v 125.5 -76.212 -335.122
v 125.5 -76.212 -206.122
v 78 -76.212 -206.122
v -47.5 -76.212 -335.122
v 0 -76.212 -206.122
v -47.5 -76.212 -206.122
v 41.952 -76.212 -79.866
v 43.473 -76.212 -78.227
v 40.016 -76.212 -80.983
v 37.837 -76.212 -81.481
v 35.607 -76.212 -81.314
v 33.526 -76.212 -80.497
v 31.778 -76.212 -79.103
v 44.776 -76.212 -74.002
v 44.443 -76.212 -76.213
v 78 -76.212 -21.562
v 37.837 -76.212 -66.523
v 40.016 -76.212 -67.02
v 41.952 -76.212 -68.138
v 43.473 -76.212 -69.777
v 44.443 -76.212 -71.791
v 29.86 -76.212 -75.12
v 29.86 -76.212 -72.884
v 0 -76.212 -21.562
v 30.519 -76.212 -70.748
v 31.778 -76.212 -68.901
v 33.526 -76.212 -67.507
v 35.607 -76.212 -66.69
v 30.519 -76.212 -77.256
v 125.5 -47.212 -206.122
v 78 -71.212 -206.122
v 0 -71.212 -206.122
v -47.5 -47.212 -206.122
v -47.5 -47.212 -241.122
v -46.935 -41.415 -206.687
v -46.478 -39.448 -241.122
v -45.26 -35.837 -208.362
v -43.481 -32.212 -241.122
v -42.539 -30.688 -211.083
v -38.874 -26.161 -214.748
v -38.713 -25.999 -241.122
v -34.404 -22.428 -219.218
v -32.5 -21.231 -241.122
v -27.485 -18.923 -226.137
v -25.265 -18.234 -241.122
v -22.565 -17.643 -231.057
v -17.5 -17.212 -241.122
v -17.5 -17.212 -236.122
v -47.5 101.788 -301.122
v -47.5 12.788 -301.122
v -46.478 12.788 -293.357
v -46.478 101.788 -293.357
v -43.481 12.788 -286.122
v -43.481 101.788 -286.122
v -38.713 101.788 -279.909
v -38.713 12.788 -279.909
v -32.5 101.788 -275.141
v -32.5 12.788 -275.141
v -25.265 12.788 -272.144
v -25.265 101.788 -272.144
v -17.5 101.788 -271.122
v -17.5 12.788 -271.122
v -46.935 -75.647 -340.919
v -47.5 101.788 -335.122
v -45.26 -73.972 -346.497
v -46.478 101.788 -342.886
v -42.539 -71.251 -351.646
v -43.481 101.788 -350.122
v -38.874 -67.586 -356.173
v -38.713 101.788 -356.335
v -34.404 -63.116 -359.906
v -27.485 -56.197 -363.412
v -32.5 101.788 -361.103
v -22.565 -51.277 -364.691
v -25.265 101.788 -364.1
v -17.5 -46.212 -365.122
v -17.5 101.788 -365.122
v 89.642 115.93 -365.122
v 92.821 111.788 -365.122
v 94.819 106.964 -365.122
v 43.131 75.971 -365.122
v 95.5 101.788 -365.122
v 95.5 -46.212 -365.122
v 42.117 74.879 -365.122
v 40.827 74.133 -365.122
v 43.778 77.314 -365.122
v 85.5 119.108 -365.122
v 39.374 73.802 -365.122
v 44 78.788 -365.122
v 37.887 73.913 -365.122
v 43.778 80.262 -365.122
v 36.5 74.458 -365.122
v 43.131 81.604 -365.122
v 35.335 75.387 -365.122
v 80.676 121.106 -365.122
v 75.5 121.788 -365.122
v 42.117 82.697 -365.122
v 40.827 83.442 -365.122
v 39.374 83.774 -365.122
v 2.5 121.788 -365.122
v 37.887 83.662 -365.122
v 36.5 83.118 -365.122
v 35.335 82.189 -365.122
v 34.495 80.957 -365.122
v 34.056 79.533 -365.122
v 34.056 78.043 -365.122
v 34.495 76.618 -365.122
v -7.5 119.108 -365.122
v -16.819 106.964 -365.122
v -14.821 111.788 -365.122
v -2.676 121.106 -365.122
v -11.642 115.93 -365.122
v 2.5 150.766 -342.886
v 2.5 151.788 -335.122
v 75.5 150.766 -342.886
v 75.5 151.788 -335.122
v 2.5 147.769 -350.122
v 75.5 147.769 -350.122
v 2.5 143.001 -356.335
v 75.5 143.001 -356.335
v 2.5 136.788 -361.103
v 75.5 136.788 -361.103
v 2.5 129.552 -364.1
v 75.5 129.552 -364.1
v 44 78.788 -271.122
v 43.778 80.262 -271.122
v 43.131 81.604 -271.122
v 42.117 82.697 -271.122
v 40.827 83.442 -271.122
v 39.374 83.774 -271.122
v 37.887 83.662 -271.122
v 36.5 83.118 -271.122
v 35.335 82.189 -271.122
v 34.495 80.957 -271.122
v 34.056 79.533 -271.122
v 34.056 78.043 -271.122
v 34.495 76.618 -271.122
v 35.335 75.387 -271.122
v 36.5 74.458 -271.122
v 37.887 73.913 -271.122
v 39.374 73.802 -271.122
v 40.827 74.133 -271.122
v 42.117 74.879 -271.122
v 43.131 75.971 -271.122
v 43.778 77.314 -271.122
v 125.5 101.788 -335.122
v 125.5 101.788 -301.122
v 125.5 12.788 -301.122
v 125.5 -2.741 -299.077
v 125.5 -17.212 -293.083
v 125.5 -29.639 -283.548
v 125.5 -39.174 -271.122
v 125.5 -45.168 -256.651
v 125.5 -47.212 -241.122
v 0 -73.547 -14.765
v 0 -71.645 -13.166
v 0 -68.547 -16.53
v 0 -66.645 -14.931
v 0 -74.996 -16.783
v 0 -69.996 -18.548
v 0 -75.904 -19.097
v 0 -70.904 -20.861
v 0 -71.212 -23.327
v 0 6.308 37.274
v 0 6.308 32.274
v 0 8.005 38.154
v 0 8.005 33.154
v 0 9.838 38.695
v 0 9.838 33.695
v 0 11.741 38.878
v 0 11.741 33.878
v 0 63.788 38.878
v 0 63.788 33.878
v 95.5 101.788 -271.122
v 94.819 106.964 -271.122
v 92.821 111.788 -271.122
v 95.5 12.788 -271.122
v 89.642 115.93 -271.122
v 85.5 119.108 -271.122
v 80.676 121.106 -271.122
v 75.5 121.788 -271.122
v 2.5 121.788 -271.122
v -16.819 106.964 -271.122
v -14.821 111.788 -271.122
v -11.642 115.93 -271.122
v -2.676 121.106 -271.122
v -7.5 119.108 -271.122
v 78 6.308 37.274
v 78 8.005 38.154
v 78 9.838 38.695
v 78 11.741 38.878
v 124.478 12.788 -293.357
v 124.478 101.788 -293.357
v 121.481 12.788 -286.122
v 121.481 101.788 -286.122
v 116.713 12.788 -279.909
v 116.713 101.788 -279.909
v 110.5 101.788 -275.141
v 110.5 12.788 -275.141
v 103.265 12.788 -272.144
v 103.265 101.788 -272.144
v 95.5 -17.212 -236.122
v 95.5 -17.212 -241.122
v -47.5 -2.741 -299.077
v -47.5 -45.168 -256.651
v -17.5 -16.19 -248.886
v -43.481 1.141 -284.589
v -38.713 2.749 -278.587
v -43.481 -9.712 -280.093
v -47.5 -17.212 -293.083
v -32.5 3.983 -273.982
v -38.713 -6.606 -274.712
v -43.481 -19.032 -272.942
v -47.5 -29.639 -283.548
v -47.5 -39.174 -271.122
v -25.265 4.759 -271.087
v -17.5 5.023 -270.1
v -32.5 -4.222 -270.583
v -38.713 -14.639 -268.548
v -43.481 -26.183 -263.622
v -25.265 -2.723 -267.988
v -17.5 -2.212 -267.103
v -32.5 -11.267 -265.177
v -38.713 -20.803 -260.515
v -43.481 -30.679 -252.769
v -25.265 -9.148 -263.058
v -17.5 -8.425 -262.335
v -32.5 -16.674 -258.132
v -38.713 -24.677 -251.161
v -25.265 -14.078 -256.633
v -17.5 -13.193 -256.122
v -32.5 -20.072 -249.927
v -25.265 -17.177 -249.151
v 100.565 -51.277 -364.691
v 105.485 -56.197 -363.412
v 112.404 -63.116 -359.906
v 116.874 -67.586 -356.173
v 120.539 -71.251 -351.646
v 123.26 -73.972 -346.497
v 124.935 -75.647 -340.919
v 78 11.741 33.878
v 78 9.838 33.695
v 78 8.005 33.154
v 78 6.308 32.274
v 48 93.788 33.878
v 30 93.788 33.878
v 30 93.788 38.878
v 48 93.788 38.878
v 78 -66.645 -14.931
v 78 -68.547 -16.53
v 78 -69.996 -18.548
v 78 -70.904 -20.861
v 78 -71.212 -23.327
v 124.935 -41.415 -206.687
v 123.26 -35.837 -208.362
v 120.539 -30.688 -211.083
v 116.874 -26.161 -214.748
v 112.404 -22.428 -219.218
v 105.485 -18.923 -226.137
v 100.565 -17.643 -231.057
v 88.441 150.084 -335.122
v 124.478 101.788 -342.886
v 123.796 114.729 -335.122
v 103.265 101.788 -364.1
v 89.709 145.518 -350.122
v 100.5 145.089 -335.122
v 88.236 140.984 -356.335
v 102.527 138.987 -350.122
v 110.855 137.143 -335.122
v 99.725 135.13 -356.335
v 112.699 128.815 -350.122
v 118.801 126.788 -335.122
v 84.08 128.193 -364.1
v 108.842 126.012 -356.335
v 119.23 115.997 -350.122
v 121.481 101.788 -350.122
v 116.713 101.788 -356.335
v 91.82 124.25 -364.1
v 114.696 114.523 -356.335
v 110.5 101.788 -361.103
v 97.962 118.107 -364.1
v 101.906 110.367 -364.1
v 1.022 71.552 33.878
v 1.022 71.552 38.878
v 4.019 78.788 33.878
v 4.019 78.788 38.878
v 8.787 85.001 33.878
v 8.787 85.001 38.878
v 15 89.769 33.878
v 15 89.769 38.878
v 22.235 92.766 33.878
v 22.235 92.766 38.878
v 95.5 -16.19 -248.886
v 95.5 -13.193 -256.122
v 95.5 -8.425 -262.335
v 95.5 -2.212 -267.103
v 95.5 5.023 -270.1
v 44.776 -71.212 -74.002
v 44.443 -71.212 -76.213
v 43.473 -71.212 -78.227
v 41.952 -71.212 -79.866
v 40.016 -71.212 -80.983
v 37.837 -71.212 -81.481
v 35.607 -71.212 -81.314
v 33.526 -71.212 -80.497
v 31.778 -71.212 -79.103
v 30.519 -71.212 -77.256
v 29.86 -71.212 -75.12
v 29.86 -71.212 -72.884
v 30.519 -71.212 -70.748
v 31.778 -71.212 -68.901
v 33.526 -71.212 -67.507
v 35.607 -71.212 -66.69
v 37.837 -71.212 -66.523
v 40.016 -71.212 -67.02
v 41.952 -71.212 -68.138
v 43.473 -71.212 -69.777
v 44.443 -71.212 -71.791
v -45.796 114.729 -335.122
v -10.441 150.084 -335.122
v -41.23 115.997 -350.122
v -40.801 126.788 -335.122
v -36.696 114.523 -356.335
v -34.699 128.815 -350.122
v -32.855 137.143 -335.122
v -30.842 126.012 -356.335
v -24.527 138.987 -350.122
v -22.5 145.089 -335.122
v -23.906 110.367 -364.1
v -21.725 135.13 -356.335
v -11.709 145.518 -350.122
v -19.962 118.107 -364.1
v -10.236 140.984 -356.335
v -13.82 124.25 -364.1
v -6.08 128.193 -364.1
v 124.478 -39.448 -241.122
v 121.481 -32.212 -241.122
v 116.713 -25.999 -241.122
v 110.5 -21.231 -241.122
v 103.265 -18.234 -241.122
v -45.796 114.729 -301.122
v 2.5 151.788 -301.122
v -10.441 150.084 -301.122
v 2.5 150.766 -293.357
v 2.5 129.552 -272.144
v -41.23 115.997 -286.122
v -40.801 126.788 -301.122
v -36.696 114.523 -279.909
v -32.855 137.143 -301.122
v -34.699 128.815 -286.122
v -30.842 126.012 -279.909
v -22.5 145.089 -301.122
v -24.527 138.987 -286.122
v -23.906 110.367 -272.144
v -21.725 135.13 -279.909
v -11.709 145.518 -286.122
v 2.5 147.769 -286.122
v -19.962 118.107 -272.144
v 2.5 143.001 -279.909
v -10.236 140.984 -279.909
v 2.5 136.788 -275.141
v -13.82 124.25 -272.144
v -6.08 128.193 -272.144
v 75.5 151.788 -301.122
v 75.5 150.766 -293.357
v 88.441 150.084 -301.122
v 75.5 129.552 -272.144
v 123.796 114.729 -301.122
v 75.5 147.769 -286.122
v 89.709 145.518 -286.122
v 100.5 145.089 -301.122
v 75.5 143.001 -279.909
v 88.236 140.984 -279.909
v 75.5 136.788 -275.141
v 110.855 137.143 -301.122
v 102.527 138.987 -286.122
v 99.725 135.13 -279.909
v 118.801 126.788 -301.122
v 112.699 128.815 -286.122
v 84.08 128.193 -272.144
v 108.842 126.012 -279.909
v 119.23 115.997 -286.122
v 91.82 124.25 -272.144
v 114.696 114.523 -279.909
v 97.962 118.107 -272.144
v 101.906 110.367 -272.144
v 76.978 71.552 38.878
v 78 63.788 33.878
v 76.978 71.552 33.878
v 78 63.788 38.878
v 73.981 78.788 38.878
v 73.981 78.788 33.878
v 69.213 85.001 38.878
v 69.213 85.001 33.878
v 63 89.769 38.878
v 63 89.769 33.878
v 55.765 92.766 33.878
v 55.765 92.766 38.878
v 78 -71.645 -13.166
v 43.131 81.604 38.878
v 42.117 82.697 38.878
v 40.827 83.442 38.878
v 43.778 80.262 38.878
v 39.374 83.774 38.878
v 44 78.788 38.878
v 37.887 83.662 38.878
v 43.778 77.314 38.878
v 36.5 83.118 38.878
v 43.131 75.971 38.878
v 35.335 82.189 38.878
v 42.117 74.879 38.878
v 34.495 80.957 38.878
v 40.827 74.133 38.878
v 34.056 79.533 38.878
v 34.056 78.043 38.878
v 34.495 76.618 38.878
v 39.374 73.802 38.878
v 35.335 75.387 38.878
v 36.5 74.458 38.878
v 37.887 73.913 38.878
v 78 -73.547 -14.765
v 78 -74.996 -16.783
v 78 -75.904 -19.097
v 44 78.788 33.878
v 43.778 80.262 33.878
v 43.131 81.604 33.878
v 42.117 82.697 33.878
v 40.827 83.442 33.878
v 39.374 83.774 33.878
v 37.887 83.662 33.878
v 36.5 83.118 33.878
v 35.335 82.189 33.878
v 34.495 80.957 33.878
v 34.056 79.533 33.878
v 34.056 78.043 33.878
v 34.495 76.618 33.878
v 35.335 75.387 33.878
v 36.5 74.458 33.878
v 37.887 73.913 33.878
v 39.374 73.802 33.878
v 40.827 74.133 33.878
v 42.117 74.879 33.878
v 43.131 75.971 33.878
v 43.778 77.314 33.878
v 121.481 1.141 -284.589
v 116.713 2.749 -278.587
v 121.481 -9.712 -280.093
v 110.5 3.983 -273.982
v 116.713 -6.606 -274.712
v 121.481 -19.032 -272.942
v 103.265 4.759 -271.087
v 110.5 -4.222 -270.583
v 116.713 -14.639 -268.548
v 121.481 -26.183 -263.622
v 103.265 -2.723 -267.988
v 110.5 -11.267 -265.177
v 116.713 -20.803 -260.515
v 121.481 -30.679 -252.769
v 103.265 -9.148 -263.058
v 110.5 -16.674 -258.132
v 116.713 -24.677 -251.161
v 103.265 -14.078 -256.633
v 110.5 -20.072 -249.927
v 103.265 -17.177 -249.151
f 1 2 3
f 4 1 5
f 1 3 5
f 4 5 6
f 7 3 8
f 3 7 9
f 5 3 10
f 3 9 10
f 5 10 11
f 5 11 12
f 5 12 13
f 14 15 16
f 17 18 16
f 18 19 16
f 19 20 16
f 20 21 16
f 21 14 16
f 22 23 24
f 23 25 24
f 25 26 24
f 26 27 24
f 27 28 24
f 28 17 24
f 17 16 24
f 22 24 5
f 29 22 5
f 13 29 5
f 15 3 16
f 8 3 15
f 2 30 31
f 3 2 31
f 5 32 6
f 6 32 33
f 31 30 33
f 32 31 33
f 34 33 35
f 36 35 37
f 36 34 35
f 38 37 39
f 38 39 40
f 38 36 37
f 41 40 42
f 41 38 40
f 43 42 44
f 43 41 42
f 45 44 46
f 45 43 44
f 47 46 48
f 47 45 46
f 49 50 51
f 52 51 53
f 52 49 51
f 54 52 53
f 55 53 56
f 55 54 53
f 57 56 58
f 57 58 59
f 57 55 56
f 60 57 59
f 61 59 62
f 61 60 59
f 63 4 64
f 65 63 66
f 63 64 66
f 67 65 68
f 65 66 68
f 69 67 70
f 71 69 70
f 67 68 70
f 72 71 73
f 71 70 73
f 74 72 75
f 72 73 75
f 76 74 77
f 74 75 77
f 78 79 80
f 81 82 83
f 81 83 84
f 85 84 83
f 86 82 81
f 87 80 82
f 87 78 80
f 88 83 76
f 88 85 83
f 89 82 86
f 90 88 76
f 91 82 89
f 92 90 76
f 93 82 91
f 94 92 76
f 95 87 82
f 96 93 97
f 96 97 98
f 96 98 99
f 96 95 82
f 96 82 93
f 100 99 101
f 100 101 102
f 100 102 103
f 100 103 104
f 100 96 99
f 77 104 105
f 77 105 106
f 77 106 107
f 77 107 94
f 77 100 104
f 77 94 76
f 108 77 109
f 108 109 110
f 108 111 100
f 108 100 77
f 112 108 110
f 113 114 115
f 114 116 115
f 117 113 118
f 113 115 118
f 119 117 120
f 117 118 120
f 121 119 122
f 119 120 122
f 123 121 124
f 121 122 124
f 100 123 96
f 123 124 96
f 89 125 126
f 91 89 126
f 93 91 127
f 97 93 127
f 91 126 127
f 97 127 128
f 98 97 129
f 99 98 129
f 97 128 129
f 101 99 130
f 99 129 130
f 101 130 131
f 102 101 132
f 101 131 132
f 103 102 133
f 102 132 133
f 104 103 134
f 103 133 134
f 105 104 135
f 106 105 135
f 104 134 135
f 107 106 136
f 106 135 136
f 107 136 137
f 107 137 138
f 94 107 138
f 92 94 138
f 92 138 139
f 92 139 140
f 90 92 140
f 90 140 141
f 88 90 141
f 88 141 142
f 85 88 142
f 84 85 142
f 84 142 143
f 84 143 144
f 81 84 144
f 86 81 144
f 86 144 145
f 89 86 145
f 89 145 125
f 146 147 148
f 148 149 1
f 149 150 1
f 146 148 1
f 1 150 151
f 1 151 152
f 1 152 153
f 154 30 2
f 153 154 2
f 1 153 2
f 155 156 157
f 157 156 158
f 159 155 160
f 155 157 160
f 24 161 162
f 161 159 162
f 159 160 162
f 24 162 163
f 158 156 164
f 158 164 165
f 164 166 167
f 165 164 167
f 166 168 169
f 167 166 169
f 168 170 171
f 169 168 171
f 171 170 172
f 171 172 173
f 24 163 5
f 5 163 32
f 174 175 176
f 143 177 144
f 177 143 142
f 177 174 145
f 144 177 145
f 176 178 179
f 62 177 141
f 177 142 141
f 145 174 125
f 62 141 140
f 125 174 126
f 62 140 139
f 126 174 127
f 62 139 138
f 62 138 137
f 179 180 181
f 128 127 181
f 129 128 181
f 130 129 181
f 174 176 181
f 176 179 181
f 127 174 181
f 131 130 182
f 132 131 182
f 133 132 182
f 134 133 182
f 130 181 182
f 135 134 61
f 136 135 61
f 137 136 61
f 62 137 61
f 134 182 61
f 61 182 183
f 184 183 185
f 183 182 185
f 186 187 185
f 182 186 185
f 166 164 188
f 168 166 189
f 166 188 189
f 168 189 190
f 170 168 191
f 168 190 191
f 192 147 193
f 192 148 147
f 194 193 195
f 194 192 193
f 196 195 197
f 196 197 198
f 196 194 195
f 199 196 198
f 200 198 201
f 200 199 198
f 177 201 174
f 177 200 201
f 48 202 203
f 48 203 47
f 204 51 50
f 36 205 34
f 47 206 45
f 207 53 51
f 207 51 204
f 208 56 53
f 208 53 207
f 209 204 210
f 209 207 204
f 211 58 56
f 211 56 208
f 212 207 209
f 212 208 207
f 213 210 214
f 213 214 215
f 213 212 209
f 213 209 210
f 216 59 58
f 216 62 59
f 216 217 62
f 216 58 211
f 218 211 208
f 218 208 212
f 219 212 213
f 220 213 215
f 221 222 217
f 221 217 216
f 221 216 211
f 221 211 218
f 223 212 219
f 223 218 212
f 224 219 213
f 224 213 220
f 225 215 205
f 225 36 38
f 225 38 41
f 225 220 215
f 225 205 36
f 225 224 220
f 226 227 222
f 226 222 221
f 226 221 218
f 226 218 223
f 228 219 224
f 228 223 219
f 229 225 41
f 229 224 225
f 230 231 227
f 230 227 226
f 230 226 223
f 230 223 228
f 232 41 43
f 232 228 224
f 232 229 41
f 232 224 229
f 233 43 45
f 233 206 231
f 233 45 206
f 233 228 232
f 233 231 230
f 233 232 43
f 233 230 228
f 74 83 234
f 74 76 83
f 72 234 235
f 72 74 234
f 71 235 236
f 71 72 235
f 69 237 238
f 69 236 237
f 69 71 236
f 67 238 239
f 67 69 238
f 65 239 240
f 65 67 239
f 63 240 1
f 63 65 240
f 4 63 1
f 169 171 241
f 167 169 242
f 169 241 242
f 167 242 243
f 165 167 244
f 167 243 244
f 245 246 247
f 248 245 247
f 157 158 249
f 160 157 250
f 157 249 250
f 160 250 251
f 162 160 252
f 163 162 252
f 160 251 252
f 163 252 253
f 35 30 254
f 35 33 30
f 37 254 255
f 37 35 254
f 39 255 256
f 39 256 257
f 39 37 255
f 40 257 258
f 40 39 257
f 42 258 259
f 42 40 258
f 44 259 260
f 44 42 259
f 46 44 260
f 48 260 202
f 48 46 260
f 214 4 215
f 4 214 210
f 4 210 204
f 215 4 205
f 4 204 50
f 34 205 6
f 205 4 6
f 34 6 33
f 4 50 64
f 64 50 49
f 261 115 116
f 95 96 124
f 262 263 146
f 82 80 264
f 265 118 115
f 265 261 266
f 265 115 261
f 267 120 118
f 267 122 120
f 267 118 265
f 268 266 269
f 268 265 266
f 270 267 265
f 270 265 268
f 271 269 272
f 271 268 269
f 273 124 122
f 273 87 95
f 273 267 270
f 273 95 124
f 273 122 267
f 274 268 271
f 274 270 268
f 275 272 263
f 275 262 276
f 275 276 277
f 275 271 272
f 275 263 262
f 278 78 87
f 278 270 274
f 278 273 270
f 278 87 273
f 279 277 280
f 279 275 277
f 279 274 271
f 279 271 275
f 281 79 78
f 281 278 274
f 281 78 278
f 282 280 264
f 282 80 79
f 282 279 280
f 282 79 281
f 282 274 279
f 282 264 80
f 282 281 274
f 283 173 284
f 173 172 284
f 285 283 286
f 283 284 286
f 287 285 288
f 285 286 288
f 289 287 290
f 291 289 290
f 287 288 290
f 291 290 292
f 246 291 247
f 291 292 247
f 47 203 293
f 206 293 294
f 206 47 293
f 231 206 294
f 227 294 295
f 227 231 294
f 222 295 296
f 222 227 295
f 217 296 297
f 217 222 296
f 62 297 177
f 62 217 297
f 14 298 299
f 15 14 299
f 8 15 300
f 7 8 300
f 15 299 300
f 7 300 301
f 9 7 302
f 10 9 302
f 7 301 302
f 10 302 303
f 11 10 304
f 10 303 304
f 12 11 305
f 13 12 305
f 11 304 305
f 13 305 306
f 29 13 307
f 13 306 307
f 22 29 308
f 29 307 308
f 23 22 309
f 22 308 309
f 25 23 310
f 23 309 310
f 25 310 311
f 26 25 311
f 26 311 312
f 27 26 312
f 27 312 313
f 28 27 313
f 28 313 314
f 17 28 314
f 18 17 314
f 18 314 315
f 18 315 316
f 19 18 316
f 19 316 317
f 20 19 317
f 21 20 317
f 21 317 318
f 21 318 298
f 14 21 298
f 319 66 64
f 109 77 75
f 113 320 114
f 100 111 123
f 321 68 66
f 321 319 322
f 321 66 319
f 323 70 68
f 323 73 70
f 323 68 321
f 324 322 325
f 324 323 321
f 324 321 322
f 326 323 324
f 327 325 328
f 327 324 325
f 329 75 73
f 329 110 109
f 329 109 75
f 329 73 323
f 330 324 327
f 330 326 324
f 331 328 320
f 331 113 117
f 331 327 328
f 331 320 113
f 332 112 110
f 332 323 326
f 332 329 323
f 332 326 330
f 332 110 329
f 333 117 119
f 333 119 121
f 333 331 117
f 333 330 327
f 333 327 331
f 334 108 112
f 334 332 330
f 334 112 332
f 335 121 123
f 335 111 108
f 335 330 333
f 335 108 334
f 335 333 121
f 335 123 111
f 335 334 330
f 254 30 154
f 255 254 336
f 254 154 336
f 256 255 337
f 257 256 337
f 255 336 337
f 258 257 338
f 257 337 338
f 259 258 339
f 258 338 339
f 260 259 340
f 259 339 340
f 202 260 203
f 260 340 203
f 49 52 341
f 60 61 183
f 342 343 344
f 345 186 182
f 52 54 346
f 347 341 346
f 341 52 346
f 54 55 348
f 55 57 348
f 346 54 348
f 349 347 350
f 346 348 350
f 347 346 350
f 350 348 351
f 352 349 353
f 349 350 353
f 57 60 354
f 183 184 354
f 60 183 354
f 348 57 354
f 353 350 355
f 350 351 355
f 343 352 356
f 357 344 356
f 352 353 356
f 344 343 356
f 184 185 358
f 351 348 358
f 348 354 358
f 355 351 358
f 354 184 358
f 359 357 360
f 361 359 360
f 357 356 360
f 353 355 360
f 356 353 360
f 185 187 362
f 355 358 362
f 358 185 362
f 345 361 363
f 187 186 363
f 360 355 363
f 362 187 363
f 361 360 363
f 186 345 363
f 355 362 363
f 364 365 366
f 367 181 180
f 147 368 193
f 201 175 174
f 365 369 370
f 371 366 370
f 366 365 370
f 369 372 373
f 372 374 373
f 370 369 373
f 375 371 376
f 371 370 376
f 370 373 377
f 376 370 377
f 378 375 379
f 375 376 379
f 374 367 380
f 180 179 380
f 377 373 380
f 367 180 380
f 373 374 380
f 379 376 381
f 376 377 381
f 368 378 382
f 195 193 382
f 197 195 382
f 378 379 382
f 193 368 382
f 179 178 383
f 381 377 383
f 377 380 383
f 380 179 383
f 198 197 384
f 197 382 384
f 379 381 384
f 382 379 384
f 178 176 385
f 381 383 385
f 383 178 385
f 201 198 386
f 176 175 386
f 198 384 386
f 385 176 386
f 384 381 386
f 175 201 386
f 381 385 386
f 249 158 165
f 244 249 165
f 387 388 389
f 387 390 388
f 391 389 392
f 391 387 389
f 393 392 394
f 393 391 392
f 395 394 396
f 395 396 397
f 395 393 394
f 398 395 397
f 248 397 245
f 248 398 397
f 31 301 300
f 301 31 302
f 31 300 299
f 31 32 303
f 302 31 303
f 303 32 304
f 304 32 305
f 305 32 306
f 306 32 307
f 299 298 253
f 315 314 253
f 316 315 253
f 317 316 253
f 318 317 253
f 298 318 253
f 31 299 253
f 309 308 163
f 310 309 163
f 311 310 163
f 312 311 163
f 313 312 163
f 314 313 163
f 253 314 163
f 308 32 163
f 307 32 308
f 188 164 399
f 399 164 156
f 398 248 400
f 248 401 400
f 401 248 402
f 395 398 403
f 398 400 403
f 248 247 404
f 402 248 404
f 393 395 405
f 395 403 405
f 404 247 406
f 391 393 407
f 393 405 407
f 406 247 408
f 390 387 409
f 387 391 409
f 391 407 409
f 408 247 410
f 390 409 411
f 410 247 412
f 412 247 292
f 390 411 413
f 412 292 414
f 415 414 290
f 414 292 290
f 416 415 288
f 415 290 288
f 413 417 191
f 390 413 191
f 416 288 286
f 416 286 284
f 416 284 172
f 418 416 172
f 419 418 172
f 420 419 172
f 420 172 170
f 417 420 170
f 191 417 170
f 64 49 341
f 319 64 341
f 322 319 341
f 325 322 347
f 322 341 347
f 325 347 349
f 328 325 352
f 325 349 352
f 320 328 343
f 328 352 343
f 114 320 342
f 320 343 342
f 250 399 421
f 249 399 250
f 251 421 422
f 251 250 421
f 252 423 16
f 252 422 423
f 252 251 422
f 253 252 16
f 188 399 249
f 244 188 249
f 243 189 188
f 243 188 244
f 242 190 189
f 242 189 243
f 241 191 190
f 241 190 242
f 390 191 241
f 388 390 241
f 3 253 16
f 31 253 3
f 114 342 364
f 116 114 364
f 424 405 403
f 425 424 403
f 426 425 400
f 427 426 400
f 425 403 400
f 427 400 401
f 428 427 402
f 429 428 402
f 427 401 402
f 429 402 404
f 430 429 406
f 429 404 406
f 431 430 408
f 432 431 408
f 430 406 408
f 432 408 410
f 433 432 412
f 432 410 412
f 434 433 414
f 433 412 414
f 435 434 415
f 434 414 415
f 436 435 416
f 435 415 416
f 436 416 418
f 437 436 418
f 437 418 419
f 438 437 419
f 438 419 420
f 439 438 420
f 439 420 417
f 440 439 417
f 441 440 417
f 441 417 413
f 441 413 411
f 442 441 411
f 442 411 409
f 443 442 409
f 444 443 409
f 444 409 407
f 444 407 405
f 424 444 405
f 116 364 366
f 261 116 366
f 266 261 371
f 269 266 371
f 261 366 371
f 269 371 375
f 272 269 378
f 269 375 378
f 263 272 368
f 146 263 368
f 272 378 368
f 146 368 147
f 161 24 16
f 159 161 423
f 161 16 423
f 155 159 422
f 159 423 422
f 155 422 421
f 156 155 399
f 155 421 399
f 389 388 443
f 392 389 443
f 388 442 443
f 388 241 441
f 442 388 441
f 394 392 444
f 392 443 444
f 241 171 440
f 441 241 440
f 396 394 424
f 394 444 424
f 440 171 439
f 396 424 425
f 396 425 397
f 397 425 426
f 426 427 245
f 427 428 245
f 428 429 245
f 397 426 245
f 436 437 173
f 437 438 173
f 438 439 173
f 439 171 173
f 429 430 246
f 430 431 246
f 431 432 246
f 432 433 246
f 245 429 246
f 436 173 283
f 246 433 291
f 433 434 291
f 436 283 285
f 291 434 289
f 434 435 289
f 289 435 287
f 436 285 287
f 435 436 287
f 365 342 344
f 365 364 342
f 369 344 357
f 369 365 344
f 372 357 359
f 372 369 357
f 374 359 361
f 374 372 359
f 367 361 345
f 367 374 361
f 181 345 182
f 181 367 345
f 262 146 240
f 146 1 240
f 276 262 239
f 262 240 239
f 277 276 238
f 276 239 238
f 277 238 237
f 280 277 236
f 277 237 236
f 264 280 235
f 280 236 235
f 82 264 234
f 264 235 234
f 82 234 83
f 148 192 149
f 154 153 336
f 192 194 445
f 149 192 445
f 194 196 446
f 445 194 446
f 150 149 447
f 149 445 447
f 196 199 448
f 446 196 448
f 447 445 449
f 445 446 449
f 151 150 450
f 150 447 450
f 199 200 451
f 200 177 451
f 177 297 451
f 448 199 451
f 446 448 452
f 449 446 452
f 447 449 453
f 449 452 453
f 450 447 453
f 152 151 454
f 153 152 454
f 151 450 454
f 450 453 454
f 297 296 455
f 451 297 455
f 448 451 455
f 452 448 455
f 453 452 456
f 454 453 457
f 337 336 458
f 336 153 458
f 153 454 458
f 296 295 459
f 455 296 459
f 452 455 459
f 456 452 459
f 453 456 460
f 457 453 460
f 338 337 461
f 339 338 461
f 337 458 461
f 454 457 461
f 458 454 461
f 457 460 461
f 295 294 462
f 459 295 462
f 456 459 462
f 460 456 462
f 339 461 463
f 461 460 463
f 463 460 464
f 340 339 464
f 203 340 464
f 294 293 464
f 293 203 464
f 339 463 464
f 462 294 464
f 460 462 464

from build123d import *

# Parameters (mm, degrees)
EXTRUDE1_DEPTH = 78
FILLET1_R      = 20
FILLET2_R      = 10
SKETCH3_R      = 7.5
EXTRUDE3_DEPTH = 6
FILLET3_R      = 30
SKETCH4_W      = 276.639181173
SKETCH4_H      = 310.570393871
EXTRUDE4_DEPTH = 79
SKETCH5_W      = 173
SKETCH5_H      = 59
EXTRUDE5_DEPTH = 65
EXTRUDE6_DEPTH = 94
SKETCH2_R      = 5
EXTRUDE2_DEPTH = 405
FILLET4_R      = 30
FILLET5_R      = 30


with BuildPart() as part:
    # Sketch1 → Extrude1 (new body)
    with BuildSketch(Plane(origin=(0, 0, 0), x_dir=(0, 0, -1), z_dir=(1, 0, 0))):
        Polygon((-38.878108718, 93.787762145), (-38.878108718, 8.787762145), (16.121891282, -76.212237855), (361.121891282, -76.212237855), (361.121891282, 123.787762145), (356.121891282, 123.787762145), (356.121891282, -71.212237855), (17.886597165, -71.212237855), (-33.878108718, 8.787762145), (-33.878108718, 93.787762145), align=None)
    extrude(amount=EXTRUDE1_DEPTH)

    # Fillet1
    fillet1_edges = [part.edges().sort_by_distance(p)[0] for p in [
        (39, -71.212237855, -356.121891282),
        (39, -76.212237855, -361.121891282),
    ]]
    fillet(fillet1_edges, radius=FILLET1_R)

    # Fillet2
    fillet2_edges = [part.edges().sort_by_distance(p)[0] for p in [
        (39, 8.787762145, 33.878108718),
        (39, -71.212237855, -17.886597165),
        (39, -76.212237855, -16.121891282),
        (39, 8.787762145, 38.878108718),
    ]]
    fillet(fillet2_edges, radius=FILLET2_R)

    # Sketch3 → Extrude3 (cut, through all)
    with BuildSketch(Plane(origin=(0, -71.212237855, 0), x_dir=(1, 0, 0), z_dir=(0, 1, 0))):
        with Locations((37.276272586, 74.00186583)):
            Circle(SKETCH3_R)
    extrude(amount=-EXTRUDE3_DEPTH, mode=Mode.SUBTRACT)

    # Fillet3
    fillet3_edges = [part.edges().sort_by_distance(p)[0] for p in [
        (0, 93.787762145, 36.378108718),
        (78, 93.787762145, 36.378108718),
    ]]
    fillet(fillet3_edges, radius=FILLET3_R)

    # Sketch4 → Extrude4 (cut, through all)
    with BuildSketch(Plane(origin=(78, 0, 0), x_dir=(0, 0, -1), z_dir=(1, 0, 0))):
        with Locations((344.441481869, 21.193022351)):
            Rectangle(SKETCH4_W, SKETCH4_H)
    extrude(amount=-EXTRUDE4_DEPTH, mode=Mode.SUBTRACT)

    # Sketch5 → Extrude5 (add)
    with BuildSketch(Plane(origin=(0, 0, -206.121891282), x_dir=(-1, 0, 0), z_dir=(0, 0, -1))):
        with Locations((-39, -46.712237855)):
            Rectangle(SKETCH5_W, SKETCH5_H)
    extrude(amount=EXTRUDE5_DEPTH)

    # Sketch6 → Extrude6 (add)
    with BuildSketch(Plane(origin=(0, 0, -271.121891282), x_dir=(-1, 0, 0), z_dir=(0, 0, -1))):
        with BuildLine():
            Line((-125.5, -76.212237855), (47.5, -76.212237855))
            Line((47.5, -76.212237855), (47.5, 101.787762145))
            ThreePointArc((47.5, 101.787762145), (32.855339059, 137.143101205), (-2.5, 151.787762145))
            Line((-2.5, 151.787762145), (-75.5, 151.787762145))
            ThreePointArc((-75.5, 151.787762145), (-110.855339059, 137.143101205), (-125.5, 101.787762145))
            Line((-125.5, 101.787762145), (-125.5, -76.212237855))
        make_face()
    extrude(amount=EXTRUDE6_DEPTH)

    # Sketch2 → Extrude2 (cut, through all)
    with BuildSketch(Plane.XY.offset(38.878108718)):
        with Locations((39, 78.787762145)):
            Circle(SKETCH2_R)
    extrude(amount=-EXTRUDE2_DEPTH, mode=Mode.SUBTRACT)

    # Fillet4
    fillet4_edges = [part.edges().sort_by_distance(p)[0] for p in [
        (125.5, -17.212237855, -238.621891282),
        (39, -17.212237855, -206.121891282),
        (-47.5, -17.212237855, -238.621891282),
        (39, -17.212237855, -271.121891282),
        (125.5, 42.287762145, -271.121891282),
        (-47.5, 42.287762145, -271.121891282),
        (-32.855339059, 137.143101205, -271.121891282),
        (39, 151.787762145, -271.121891282),
        (110.855339059, 137.143101205, -271.121891282),
    ]]
    fillet(fillet4_edges, radius=FILLET4_R)

    # Fillet5
    fillet5_edges = [part.edges().sort_by_distance(p)[0] for p in [
        (125.5, 12.787762145, -365.121891282),
        (39, -76.212237855, -365.121891282),
        (-47.5, 12.787762145, -365.121891282),
        (-32.855339059, 137.143101205, -365.121891282),
        (39, 151.787762145, -365.121891282),
        (110.855339059, 137.143101205, -365.121891282),
    ]]
    fillet(fillet5_edges, radius=FILLET5_R)


solid = part.part
